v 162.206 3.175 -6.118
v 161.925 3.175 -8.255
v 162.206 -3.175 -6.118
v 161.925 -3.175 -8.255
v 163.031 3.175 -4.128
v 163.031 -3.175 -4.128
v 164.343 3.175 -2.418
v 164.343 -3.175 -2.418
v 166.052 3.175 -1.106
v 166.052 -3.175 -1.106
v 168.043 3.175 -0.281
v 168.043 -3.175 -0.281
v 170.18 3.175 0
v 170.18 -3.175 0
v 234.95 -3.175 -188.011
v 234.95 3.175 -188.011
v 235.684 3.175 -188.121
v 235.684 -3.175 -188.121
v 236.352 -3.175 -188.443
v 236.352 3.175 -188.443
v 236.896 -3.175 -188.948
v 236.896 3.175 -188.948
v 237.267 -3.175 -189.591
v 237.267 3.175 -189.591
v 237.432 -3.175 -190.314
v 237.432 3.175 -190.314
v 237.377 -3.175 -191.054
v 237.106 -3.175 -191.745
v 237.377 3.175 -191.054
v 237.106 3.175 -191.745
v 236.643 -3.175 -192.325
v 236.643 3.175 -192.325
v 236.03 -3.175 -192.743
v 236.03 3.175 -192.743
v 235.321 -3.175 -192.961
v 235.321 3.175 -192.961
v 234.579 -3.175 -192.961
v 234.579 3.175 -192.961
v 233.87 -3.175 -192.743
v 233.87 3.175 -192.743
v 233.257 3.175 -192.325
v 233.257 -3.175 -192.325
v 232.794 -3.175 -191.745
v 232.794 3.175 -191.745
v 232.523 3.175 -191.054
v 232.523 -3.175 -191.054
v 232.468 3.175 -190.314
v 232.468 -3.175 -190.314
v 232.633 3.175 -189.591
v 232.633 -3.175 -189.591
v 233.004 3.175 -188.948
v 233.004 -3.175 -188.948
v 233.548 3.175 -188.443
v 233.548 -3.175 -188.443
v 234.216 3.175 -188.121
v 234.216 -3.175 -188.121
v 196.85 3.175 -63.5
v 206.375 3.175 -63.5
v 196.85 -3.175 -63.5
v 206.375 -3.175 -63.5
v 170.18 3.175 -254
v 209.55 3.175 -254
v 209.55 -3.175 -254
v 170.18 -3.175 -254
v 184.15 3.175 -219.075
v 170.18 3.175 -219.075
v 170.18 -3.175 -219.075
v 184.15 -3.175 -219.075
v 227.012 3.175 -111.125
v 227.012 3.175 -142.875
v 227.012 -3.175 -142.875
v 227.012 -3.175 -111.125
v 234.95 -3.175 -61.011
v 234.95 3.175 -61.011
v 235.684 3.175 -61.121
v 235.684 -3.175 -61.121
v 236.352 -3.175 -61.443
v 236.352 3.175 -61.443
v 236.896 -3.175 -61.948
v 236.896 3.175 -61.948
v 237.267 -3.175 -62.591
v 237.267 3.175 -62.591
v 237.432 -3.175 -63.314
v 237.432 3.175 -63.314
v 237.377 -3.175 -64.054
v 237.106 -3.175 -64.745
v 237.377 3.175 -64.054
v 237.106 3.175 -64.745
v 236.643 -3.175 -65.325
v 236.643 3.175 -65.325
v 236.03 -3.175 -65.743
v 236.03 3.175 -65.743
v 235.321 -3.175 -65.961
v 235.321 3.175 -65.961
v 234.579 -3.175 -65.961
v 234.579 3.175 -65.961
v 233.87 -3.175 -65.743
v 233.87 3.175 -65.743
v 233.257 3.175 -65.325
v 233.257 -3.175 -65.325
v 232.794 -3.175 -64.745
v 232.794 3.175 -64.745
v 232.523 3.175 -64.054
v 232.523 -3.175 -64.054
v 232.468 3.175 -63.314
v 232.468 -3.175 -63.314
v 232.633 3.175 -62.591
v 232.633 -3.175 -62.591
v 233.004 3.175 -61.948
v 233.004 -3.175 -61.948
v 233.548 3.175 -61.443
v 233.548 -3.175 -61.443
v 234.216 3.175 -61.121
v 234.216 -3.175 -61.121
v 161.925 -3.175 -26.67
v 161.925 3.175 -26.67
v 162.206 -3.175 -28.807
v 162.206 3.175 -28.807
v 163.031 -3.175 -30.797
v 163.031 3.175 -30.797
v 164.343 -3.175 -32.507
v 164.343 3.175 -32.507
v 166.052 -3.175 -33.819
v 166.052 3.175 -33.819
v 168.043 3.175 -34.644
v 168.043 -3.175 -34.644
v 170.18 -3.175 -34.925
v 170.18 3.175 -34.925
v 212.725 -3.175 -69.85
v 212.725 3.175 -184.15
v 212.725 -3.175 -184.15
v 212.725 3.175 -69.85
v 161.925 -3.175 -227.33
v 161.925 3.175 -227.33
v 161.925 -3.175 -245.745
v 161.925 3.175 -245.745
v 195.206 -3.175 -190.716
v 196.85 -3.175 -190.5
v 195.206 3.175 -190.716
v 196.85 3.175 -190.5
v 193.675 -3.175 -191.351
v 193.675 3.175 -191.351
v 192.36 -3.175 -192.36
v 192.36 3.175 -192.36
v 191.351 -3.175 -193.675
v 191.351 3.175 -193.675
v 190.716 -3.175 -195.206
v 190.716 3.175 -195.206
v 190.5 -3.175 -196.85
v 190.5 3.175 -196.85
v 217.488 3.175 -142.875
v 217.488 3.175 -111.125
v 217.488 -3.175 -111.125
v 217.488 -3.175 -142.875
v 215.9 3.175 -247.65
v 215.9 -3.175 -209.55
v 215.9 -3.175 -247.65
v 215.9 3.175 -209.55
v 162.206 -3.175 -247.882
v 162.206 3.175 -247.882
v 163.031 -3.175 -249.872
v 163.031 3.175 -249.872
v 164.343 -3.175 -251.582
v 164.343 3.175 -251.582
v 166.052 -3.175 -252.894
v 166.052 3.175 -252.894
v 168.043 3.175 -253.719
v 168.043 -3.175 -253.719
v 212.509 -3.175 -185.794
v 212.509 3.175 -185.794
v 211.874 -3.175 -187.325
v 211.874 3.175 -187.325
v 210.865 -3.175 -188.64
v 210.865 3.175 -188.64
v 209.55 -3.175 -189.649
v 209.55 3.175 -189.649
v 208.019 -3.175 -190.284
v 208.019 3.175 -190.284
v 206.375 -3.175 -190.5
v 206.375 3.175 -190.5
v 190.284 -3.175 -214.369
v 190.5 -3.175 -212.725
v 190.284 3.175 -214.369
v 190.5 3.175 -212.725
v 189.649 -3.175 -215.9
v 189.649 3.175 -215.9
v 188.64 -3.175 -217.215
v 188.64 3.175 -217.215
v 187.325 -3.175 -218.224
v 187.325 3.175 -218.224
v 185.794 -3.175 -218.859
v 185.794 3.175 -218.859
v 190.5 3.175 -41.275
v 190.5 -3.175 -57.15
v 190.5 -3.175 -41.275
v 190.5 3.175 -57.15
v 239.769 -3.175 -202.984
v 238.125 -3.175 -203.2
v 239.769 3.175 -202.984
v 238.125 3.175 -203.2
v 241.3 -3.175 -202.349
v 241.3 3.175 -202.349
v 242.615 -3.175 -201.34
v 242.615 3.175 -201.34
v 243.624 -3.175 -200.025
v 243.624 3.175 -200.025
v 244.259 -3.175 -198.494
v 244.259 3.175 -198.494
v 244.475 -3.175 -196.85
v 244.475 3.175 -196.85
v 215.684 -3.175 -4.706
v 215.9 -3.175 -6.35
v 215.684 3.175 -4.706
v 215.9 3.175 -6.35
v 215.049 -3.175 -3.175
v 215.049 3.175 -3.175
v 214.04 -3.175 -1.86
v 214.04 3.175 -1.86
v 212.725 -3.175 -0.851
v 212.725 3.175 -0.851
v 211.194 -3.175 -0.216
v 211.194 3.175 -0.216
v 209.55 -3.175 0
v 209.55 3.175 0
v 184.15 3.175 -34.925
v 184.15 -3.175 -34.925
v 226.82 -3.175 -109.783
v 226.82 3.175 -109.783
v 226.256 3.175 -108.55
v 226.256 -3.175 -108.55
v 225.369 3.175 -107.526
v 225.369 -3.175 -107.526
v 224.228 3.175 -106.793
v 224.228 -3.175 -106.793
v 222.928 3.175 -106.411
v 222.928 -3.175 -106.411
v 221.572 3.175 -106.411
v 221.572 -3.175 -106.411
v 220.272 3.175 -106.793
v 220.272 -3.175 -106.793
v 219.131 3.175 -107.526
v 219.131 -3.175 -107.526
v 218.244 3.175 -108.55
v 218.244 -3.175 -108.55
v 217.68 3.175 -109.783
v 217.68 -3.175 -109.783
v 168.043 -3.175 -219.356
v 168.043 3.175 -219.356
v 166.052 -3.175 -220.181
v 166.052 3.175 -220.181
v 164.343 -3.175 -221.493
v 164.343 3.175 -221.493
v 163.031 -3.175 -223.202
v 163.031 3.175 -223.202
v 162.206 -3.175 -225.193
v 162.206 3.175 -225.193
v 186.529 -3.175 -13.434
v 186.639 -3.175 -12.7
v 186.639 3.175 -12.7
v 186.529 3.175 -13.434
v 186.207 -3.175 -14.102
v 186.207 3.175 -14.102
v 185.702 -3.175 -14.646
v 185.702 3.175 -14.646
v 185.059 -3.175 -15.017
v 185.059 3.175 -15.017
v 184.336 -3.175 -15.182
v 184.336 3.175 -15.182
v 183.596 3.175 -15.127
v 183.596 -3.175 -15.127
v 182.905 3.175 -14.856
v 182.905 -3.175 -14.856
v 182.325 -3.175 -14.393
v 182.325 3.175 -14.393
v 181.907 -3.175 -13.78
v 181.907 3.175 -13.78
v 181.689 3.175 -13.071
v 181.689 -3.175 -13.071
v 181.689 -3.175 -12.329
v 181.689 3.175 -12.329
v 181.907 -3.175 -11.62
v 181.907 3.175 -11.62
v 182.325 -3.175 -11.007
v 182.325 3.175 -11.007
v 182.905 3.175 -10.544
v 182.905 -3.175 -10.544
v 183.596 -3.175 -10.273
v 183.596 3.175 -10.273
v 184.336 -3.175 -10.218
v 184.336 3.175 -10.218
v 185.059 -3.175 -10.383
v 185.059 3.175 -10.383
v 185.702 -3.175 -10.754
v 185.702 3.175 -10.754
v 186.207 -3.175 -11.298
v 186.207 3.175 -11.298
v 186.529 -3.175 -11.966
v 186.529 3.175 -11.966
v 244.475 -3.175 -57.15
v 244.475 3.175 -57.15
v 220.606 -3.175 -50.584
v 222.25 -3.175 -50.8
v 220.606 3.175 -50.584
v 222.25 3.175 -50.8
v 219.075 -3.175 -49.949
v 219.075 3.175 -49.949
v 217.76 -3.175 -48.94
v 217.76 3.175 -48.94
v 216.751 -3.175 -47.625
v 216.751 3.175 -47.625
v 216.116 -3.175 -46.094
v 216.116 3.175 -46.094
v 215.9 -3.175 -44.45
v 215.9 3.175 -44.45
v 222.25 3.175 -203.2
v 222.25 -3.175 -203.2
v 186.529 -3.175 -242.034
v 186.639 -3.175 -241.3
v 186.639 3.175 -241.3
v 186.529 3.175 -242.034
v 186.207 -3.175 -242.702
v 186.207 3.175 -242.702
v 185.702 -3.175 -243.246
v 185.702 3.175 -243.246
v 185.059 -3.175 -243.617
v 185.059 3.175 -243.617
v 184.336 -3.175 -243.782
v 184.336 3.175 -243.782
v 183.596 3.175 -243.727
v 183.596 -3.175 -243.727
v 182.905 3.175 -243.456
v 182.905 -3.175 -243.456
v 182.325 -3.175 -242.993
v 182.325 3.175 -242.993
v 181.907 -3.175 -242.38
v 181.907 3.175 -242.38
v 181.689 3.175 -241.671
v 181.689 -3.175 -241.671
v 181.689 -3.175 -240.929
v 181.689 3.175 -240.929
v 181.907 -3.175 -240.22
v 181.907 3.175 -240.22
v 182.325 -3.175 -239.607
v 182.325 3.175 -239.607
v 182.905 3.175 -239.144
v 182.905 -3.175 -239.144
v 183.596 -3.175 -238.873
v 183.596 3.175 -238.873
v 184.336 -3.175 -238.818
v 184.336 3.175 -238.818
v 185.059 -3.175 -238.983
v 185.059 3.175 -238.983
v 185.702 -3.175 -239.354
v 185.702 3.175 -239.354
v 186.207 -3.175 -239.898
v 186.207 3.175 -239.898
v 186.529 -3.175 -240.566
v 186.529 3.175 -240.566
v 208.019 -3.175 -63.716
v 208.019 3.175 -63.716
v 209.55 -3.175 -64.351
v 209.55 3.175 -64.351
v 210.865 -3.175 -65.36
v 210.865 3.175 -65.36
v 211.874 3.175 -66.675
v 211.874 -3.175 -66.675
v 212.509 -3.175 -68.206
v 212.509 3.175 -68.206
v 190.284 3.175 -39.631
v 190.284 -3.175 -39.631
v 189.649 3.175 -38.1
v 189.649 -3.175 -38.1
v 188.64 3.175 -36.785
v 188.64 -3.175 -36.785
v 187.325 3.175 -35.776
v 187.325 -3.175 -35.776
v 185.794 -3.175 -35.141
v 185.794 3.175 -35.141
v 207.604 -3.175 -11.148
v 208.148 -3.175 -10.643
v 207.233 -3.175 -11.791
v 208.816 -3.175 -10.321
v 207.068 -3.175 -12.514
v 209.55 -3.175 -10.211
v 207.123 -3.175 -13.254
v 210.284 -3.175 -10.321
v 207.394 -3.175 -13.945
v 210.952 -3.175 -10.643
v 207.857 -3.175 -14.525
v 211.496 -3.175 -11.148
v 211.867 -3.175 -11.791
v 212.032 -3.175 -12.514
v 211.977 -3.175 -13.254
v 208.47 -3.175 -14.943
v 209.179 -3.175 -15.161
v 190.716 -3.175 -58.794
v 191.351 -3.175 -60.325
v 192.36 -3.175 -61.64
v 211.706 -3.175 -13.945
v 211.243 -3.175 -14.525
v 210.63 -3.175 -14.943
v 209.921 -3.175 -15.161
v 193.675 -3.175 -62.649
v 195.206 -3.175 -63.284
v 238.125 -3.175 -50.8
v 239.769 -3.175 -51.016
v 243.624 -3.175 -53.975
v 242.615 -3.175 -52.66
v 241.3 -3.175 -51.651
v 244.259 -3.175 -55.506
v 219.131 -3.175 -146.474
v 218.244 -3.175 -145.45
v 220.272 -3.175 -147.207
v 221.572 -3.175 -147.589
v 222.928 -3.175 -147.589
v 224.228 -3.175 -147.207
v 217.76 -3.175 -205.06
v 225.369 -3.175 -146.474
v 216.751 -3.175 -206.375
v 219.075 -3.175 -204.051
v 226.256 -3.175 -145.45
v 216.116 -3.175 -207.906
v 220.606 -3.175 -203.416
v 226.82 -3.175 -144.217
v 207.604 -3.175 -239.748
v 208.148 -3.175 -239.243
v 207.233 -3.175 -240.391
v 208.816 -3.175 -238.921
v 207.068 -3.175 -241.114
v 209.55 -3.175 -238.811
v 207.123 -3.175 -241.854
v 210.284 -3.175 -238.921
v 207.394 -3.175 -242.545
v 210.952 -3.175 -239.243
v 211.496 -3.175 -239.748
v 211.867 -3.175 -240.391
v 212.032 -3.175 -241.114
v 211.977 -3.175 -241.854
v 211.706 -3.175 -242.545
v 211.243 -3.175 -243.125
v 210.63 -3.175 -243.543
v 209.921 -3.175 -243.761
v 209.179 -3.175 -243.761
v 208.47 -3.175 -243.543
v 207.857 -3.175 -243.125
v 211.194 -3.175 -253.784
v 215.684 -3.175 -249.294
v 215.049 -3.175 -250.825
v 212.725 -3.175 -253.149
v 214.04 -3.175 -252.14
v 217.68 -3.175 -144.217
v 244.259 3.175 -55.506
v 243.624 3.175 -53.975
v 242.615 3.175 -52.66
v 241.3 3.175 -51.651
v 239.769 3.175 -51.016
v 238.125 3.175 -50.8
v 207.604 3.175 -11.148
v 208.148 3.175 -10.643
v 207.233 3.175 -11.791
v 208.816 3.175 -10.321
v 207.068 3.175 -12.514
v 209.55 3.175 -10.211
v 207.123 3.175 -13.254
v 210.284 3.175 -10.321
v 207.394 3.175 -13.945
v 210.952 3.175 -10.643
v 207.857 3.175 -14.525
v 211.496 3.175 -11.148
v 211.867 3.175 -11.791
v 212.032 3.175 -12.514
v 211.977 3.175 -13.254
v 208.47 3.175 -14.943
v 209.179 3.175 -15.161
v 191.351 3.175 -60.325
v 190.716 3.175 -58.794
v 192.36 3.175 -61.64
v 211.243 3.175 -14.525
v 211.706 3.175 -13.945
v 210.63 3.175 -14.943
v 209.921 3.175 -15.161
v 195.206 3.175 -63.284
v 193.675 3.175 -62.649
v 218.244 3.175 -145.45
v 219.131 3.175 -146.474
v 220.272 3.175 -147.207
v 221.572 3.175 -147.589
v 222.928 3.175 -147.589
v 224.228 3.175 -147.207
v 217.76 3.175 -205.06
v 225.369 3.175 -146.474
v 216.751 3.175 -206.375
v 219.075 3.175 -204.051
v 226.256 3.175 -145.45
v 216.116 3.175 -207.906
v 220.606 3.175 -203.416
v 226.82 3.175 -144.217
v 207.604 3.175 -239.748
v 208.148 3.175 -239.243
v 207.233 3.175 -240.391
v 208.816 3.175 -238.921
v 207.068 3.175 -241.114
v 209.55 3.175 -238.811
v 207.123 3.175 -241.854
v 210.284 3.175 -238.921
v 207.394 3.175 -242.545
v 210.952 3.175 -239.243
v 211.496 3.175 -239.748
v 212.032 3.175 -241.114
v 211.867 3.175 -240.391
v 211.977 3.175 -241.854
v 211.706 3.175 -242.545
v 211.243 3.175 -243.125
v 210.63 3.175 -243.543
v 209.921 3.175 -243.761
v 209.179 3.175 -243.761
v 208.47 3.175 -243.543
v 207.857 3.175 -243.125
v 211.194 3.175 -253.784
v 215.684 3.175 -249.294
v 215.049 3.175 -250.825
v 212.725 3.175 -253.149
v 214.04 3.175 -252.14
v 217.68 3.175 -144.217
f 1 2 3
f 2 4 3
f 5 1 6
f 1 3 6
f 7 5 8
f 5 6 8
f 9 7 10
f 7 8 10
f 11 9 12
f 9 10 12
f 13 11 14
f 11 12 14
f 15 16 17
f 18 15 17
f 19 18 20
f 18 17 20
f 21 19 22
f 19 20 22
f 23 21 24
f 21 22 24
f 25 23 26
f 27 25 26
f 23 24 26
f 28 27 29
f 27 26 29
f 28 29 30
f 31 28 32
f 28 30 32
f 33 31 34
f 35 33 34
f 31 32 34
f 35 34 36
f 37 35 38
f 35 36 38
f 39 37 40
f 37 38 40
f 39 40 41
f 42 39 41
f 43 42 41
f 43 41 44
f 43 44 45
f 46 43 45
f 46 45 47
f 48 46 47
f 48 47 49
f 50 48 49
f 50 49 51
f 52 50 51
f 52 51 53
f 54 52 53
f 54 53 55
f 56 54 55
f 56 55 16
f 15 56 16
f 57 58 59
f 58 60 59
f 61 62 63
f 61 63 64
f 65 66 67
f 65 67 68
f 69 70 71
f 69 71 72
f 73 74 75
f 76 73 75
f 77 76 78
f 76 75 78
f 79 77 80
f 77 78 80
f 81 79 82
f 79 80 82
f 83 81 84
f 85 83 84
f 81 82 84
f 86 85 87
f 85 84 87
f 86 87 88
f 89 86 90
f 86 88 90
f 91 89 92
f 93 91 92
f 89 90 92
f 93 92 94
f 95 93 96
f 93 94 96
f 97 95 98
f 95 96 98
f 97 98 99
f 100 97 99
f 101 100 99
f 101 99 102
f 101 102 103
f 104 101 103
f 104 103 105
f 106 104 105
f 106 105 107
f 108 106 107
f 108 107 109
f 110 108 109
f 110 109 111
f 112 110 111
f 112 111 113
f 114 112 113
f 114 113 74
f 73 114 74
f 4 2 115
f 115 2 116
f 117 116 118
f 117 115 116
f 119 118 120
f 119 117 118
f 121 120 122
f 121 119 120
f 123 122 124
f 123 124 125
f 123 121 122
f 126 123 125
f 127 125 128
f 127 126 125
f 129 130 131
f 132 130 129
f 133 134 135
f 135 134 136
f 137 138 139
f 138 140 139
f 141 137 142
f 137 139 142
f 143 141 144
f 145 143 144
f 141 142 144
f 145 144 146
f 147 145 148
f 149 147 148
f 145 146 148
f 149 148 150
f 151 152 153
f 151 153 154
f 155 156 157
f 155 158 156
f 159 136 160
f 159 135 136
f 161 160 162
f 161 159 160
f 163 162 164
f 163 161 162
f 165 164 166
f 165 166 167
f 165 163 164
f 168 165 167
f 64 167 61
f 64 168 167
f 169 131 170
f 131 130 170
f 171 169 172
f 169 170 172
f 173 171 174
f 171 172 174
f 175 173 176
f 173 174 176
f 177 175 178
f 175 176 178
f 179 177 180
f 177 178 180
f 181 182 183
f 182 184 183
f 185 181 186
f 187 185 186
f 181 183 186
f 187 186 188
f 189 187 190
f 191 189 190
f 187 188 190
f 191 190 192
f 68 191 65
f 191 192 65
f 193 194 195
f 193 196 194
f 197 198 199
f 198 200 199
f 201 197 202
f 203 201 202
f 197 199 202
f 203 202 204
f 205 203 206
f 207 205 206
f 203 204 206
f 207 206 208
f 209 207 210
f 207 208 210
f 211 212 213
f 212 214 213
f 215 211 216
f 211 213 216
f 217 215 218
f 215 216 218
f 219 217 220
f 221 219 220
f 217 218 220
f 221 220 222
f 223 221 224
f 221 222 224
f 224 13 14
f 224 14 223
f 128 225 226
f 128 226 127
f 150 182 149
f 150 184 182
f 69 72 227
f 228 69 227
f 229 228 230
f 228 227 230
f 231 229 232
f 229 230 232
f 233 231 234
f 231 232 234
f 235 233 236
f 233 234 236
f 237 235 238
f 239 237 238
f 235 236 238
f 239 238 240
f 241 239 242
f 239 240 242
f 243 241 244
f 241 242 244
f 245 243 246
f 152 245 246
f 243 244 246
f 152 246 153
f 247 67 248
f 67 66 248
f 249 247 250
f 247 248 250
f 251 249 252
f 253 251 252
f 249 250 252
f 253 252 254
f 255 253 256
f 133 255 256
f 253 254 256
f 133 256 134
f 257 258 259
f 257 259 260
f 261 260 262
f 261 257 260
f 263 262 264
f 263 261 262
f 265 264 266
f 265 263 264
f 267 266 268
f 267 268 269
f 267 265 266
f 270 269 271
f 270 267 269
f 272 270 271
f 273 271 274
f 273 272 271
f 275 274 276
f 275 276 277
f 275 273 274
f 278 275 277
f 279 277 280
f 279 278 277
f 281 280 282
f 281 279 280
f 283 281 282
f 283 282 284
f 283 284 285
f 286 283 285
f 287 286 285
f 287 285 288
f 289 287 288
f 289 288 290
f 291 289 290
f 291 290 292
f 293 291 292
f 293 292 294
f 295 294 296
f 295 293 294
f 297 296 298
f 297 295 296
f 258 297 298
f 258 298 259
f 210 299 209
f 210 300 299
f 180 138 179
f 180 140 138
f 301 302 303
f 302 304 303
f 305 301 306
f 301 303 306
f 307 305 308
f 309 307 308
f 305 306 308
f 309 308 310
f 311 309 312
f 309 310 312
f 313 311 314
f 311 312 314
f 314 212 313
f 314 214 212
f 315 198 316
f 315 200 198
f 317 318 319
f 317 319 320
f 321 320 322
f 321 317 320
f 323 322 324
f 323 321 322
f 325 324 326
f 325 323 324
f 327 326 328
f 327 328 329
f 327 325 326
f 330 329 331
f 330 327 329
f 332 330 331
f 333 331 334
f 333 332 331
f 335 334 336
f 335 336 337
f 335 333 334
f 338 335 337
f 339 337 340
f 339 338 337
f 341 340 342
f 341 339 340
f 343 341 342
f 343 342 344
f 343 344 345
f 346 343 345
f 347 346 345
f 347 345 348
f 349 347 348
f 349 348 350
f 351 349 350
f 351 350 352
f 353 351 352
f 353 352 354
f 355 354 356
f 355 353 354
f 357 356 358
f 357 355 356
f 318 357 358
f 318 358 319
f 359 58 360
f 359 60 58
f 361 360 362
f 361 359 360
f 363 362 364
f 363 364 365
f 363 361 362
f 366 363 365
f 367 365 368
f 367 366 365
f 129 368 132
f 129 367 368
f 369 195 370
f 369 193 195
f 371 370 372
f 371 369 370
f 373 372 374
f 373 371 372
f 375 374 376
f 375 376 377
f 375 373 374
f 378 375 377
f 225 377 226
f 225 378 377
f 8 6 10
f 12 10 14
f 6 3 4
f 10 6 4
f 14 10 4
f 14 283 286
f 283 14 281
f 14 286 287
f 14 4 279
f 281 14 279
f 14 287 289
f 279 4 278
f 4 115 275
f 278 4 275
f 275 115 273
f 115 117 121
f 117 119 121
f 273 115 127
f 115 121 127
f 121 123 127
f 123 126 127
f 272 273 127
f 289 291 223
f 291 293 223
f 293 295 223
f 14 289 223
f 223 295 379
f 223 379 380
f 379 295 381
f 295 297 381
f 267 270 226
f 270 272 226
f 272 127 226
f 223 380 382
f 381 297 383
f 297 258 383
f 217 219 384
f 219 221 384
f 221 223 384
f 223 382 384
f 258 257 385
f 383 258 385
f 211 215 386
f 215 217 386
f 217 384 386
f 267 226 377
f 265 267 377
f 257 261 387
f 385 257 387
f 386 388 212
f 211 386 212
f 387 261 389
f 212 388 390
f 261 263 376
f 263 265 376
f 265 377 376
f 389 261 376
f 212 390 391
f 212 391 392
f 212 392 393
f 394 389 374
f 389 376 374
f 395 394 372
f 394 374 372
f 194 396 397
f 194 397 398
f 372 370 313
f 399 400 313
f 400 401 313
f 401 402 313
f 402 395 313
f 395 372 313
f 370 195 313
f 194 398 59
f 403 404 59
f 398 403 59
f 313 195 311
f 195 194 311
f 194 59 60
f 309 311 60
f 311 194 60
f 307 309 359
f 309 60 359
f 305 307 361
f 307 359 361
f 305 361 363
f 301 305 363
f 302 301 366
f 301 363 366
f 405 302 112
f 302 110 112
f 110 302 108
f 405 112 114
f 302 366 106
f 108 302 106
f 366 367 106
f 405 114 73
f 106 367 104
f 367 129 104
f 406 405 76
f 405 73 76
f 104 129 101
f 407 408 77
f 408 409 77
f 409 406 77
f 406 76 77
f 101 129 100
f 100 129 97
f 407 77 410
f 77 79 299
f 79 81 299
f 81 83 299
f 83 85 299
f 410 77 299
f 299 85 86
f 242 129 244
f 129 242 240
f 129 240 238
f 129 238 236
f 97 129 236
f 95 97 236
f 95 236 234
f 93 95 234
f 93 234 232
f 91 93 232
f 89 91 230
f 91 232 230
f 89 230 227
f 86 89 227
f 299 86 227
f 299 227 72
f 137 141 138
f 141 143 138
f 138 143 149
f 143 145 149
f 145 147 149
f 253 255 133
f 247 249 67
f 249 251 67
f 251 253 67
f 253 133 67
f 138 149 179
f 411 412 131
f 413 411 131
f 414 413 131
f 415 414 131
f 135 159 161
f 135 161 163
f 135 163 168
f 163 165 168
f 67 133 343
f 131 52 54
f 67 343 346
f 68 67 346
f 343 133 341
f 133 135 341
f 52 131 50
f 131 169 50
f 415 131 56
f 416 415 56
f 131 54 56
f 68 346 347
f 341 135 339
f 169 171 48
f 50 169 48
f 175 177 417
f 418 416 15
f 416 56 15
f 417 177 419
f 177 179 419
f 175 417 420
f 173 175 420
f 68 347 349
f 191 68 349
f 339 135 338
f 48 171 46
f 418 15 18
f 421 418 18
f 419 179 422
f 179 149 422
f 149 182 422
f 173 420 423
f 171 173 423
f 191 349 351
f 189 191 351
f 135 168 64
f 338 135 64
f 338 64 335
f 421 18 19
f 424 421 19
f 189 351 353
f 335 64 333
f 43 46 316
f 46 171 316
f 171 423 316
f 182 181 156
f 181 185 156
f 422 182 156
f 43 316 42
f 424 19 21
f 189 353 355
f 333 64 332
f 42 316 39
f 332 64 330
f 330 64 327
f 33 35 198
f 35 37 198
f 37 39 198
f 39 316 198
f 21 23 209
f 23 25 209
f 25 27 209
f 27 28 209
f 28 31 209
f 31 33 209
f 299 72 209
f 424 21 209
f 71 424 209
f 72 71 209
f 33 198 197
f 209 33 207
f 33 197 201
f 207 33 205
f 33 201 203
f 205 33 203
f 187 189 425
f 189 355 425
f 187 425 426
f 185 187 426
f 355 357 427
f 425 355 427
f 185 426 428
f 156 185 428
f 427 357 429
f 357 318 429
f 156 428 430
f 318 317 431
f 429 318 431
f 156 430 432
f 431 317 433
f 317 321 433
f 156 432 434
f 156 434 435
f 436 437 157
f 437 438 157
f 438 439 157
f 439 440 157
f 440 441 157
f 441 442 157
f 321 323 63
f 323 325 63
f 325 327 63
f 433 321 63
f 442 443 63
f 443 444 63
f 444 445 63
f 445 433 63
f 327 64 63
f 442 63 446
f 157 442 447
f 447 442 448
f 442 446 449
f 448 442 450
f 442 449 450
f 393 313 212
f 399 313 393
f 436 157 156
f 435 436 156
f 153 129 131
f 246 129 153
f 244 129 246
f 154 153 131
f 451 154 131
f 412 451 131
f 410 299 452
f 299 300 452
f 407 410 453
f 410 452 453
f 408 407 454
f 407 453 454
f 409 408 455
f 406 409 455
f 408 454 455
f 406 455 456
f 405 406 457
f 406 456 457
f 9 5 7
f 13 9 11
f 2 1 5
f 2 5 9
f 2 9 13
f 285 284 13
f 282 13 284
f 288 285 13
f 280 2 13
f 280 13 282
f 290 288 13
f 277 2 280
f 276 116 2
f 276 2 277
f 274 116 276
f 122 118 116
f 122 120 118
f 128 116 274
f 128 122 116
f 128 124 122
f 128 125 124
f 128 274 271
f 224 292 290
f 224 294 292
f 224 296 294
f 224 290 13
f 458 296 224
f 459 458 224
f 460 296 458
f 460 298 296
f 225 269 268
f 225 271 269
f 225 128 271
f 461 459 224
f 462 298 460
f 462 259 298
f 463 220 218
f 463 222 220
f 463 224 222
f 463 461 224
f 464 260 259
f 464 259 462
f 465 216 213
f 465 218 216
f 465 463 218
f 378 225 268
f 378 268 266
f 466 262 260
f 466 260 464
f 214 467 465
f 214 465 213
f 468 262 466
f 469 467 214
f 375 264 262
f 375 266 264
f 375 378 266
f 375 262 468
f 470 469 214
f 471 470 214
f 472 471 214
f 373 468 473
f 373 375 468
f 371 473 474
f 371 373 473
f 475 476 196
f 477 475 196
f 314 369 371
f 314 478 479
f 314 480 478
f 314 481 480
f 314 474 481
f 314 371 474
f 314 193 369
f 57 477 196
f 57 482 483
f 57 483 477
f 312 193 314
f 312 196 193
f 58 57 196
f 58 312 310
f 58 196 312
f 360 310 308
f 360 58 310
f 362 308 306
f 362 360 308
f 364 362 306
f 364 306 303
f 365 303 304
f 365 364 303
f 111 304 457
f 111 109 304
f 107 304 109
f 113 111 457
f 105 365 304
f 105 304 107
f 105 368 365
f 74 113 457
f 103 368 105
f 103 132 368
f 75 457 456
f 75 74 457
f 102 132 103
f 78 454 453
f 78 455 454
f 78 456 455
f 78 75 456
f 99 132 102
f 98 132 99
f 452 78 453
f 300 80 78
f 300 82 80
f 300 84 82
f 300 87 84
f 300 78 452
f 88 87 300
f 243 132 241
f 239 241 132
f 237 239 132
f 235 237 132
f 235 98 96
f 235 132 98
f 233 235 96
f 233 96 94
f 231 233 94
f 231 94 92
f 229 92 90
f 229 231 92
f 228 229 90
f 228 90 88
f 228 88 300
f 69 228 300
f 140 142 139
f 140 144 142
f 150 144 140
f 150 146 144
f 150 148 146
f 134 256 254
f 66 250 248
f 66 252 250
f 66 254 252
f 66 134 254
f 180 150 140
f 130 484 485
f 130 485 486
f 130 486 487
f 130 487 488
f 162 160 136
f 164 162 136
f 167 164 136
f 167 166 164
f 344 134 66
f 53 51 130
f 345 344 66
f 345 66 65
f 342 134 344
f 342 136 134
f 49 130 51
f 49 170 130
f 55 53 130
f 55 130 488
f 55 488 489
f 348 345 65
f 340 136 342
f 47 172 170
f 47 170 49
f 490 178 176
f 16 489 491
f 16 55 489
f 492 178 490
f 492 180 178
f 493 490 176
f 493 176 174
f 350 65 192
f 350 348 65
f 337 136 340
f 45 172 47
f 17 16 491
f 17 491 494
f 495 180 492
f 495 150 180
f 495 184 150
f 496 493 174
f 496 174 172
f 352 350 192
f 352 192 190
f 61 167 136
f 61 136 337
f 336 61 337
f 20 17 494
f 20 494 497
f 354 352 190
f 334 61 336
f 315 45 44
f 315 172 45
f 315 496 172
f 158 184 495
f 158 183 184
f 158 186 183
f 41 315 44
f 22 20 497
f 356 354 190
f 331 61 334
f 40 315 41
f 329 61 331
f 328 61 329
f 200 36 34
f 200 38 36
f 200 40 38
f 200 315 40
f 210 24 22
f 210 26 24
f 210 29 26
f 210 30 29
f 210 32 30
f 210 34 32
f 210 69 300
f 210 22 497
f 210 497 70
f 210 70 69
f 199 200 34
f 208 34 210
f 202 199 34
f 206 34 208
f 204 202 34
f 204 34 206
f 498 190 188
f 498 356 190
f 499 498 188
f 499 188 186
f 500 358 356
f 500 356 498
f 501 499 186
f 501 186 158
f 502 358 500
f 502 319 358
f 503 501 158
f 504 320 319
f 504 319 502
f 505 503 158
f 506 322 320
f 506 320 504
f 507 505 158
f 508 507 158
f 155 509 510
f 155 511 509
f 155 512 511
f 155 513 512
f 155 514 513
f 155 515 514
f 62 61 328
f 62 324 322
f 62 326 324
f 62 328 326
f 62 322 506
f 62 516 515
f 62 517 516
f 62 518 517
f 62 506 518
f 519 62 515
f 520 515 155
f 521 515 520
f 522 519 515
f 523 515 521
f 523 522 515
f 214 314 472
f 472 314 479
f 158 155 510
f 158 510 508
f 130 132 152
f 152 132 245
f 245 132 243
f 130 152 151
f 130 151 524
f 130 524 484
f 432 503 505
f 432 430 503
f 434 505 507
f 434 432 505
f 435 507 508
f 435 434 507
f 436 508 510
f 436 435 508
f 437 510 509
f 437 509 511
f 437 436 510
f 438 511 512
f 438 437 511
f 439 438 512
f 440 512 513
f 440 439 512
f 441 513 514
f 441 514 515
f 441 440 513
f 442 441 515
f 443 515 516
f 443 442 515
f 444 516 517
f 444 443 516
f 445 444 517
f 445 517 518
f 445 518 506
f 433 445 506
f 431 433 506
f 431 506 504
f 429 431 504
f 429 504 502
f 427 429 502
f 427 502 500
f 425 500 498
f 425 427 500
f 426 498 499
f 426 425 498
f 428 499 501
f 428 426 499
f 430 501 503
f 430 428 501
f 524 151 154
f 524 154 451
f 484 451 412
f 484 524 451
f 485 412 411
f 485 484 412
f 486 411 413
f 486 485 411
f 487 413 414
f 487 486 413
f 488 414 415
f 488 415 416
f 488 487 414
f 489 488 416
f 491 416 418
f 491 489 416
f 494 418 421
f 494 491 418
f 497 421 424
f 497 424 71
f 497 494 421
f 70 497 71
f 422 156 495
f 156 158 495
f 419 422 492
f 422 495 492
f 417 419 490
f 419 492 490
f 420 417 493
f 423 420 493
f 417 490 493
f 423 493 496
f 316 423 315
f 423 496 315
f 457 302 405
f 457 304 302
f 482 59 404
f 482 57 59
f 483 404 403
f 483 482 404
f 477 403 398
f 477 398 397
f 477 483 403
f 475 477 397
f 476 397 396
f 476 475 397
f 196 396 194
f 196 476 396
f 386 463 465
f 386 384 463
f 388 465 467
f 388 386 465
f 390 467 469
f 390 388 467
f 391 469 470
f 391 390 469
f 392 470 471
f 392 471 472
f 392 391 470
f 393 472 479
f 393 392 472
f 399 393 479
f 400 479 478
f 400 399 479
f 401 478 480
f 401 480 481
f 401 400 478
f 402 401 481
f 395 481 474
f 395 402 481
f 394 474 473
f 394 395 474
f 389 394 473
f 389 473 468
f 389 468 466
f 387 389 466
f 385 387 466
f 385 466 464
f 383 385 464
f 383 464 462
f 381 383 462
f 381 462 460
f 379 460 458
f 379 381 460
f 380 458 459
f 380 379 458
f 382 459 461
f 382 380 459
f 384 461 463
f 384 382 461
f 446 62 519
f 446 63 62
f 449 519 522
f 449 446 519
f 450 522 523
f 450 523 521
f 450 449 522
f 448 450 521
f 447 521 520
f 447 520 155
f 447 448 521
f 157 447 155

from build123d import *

# Parameters (mm, degrees)
SKETCH1_R           = 2.4892
BOSS_EXTRUDE1_DEPTH = 3.175
FILLET1_R           = 6.35
LPATTERN1_START     = -3.175
LPATTERN1_OUTLINE_R = 2.4892
LPATTERN1_DEPTH     = 6.35
SKETCH2_R           = 2.4892
SKETCH2_W           = 190.5
SKETCH2_H           = 254
CUT_EXTRUDE1_DEPTH  = 353.596579854
FILLET2_R           = 8.255


# Read off the part's stored shape, not the designer's step: LPattern1
with BuildPart() as part:
    # Sketch1 → Boss-Extrude1 (new, symmetric)
    with BuildSketch(Plane(origin=(0, 0, 0), x_dir=(1, 0, 0), z_dir=(0, 1, 0))):
        Polygon((0, 50.8), (0, 0), (215.9, 0), (215.9, 50.8), (244.475, 50.8), (244.475, 203.2), (215.9, 203.2), (215.9, 254), (0, 254), (0, 203.2), (-28.575, 203.2), (-28.575, 50.8), align=None)
        Polygon((12.7, 190.5), (12.7, 219.075), (190.5, 219.075), (190.5, 190.5), (212.725, 190.5), (212.725, 63.5), (190.5, 63.5), (190.5, 34.925), (12.7, 34.925), (12.7, 63.5), (-9.525, 63.5), (-9.525, 190.5), align=None, mode=Mode.SUBTRACT)
        with Locations(Location((209.55, 12.7, 0), (0, 0, 270))):
            Circle(SKETCH1_R, mode=Mode.SUBTRACT)
        with BuildLine():
            Line((227.0125, 142.875), (227.0125, 111.125))
            ThreePointArc((227.0125, 111.125), (222.25, 106.3625), (217.4875, 111.125))
            Line((217.4875, 111.125), (217.4875, 142.875))
            ThreePointArc((217.4875, 142.875), (222.25, 147.6375), (227.0125, 142.875))
        make_face(mode=Mode.SUBTRACT)
        with BuildLine():
            ThreePointArc((-14.2875, 111.125), (-19.05, 106.3625), (-23.8125, 111.125))
            Line((-23.8125, 111.125), (-23.8125, 142.875))
            ThreePointArc((-23.8125, 142.875), (-19.05, 147.6375), (-14.2875, 142.875))
            Line((-14.2875, 142.875), (-14.2875, 111.125))
        make_face(mode=Mode.SUBTRACT)
        with Locations(Location((209.55, 241.3, 0), (0, 0, 270))):
            Circle(SKETCH1_R, mode=Mode.SUBTRACT)
    extrude(amount=BOSS_EXTRUDE1_DEPTH, both=True)

    # Fillet1
    fillet1_edges = [part.edges().sort_by_distance(p)[0] for p in [
        (0, 0, 0),
        (0, 0, -50.8),
        (-28.575, 0, -50.8),
        (-28.575, 0, -203.2),
        (0, 0, -203.2),
        (0, 0, -254),
        (215.9, 0, -254),
        (215.9, 0, -203.2),
        (244.475, 0, -203.2),
        (244.475, 0, -50.8),
        (215.9, 0, -50.8),
        (215.9, 0, 0),
        (212.725, 0, -190.5),
        (190.5, 0, -190.5),
        (190.5, 0, -219.075),
        (12.7, 0, -219.075),
        (12.7, 0, -190.5),
        (-9.525, 0, -190.5),
        (-9.525, 0, -63.5),
        (12.7, 0, -63.5),
        (12.7, 0, -34.925),
        (190.5, 0, -34.925),
        (190.5, 0, -63.5),
        (212.725, 0, -63.5),
    ]]
    fillet(fillet1_edges, radius=FILLET1_R)

    # LPattern1 outline → LPattern1 (cut)
    with BuildSketch(Plane(origin=(0, 0, 0), x_dir=(1, 0, 0), z_dir=(0, 1, 0)).offset(LPATTERN1_START)):
        with Locations((31.75, 12.7)):
            Circle(LPATTERN1_OUTLINE_R)
        with Locations((31.75, 241.3)):
            Circle(LPATTERN1_OUTLINE_R)
        with Locations((57.15, 12.7)):
            Circle(LPATTERN1_OUTLINE_R)
        with Locations((57.15, 241.3)):
            Circle(LPATTERN1_OUTLINE_R)
        with Locations((82.55, 12.7)):
            Circle(LPATTERN1_OUTLINE_R)
        with Locations((82.55, 241.3)):
            Circle(LPATTERN1_OUTLINE_R)
        with Locations((107.95, 12.7)):
            Circle(LPATTERN1_OUTLINE_R)
        with Locations((107.95, 241.3)):
            Circle(LPATTERN1_OUTLINE_R)
        with Locations((133.35, 12.7)):
            Circle(LPATTERN1_OUTLINE_R)
        with Locations((133.35, 241.3)):
            Circle(LPATTERN1_OUTLINE_R)
        with Locations((158.75, 12.7)):
            Circle(LPATTERN1_OUTLINE_R)
        with Locations((158.75, 241.3)):
            Circle(LPATTERN1_OUTLINE_R)
        with Locations((184.15, 12.7)):
            Circle(LPATTERN1_OUTLINE_R)
        with Locations((184.15, 241.3)):
            Circle(LPATTERN1_OUTLINE_R)
    extrude(amount=LPATTERN1_DEPTH, mode=Mode.SUBTRACT)

    # Sketch2 → Cut-Extrude1 (cut, through all)
    with BuildSketch(Plane(origin=(0, 3.175, 0), x_dir=(1, 0, 0), z_dir=(0, 1, 0))):
        with Locations(Location((234.95, 190.5, 0), (0, 0, 270))):
            Circle(SKETCH2_R)
        with Locations(Location((234.95, 63.5, 0), (0, 0, 270))):
            Circle(SKETCH2_R)
        with Locations((66.675, 127)):
            Rectangle(SKETCH2_W, SKETCH2_H)
    extrude(amount=-CUT_EXTRUDE1_DEPTH, mode=Mode.SUBTRACT)

    # Fillet2
    fillet2_edges = [part.edges().sort_by_distance(p)[0] for p in [
        (161.925, 0, -34.925),
        (161.925, 0, -219.075),
        (161.925, 0, -254),
        (161.925, 0, 0),
    ]]
    fillet(fillet2_edges, radius=FILLET2_R)


solid = part.part
